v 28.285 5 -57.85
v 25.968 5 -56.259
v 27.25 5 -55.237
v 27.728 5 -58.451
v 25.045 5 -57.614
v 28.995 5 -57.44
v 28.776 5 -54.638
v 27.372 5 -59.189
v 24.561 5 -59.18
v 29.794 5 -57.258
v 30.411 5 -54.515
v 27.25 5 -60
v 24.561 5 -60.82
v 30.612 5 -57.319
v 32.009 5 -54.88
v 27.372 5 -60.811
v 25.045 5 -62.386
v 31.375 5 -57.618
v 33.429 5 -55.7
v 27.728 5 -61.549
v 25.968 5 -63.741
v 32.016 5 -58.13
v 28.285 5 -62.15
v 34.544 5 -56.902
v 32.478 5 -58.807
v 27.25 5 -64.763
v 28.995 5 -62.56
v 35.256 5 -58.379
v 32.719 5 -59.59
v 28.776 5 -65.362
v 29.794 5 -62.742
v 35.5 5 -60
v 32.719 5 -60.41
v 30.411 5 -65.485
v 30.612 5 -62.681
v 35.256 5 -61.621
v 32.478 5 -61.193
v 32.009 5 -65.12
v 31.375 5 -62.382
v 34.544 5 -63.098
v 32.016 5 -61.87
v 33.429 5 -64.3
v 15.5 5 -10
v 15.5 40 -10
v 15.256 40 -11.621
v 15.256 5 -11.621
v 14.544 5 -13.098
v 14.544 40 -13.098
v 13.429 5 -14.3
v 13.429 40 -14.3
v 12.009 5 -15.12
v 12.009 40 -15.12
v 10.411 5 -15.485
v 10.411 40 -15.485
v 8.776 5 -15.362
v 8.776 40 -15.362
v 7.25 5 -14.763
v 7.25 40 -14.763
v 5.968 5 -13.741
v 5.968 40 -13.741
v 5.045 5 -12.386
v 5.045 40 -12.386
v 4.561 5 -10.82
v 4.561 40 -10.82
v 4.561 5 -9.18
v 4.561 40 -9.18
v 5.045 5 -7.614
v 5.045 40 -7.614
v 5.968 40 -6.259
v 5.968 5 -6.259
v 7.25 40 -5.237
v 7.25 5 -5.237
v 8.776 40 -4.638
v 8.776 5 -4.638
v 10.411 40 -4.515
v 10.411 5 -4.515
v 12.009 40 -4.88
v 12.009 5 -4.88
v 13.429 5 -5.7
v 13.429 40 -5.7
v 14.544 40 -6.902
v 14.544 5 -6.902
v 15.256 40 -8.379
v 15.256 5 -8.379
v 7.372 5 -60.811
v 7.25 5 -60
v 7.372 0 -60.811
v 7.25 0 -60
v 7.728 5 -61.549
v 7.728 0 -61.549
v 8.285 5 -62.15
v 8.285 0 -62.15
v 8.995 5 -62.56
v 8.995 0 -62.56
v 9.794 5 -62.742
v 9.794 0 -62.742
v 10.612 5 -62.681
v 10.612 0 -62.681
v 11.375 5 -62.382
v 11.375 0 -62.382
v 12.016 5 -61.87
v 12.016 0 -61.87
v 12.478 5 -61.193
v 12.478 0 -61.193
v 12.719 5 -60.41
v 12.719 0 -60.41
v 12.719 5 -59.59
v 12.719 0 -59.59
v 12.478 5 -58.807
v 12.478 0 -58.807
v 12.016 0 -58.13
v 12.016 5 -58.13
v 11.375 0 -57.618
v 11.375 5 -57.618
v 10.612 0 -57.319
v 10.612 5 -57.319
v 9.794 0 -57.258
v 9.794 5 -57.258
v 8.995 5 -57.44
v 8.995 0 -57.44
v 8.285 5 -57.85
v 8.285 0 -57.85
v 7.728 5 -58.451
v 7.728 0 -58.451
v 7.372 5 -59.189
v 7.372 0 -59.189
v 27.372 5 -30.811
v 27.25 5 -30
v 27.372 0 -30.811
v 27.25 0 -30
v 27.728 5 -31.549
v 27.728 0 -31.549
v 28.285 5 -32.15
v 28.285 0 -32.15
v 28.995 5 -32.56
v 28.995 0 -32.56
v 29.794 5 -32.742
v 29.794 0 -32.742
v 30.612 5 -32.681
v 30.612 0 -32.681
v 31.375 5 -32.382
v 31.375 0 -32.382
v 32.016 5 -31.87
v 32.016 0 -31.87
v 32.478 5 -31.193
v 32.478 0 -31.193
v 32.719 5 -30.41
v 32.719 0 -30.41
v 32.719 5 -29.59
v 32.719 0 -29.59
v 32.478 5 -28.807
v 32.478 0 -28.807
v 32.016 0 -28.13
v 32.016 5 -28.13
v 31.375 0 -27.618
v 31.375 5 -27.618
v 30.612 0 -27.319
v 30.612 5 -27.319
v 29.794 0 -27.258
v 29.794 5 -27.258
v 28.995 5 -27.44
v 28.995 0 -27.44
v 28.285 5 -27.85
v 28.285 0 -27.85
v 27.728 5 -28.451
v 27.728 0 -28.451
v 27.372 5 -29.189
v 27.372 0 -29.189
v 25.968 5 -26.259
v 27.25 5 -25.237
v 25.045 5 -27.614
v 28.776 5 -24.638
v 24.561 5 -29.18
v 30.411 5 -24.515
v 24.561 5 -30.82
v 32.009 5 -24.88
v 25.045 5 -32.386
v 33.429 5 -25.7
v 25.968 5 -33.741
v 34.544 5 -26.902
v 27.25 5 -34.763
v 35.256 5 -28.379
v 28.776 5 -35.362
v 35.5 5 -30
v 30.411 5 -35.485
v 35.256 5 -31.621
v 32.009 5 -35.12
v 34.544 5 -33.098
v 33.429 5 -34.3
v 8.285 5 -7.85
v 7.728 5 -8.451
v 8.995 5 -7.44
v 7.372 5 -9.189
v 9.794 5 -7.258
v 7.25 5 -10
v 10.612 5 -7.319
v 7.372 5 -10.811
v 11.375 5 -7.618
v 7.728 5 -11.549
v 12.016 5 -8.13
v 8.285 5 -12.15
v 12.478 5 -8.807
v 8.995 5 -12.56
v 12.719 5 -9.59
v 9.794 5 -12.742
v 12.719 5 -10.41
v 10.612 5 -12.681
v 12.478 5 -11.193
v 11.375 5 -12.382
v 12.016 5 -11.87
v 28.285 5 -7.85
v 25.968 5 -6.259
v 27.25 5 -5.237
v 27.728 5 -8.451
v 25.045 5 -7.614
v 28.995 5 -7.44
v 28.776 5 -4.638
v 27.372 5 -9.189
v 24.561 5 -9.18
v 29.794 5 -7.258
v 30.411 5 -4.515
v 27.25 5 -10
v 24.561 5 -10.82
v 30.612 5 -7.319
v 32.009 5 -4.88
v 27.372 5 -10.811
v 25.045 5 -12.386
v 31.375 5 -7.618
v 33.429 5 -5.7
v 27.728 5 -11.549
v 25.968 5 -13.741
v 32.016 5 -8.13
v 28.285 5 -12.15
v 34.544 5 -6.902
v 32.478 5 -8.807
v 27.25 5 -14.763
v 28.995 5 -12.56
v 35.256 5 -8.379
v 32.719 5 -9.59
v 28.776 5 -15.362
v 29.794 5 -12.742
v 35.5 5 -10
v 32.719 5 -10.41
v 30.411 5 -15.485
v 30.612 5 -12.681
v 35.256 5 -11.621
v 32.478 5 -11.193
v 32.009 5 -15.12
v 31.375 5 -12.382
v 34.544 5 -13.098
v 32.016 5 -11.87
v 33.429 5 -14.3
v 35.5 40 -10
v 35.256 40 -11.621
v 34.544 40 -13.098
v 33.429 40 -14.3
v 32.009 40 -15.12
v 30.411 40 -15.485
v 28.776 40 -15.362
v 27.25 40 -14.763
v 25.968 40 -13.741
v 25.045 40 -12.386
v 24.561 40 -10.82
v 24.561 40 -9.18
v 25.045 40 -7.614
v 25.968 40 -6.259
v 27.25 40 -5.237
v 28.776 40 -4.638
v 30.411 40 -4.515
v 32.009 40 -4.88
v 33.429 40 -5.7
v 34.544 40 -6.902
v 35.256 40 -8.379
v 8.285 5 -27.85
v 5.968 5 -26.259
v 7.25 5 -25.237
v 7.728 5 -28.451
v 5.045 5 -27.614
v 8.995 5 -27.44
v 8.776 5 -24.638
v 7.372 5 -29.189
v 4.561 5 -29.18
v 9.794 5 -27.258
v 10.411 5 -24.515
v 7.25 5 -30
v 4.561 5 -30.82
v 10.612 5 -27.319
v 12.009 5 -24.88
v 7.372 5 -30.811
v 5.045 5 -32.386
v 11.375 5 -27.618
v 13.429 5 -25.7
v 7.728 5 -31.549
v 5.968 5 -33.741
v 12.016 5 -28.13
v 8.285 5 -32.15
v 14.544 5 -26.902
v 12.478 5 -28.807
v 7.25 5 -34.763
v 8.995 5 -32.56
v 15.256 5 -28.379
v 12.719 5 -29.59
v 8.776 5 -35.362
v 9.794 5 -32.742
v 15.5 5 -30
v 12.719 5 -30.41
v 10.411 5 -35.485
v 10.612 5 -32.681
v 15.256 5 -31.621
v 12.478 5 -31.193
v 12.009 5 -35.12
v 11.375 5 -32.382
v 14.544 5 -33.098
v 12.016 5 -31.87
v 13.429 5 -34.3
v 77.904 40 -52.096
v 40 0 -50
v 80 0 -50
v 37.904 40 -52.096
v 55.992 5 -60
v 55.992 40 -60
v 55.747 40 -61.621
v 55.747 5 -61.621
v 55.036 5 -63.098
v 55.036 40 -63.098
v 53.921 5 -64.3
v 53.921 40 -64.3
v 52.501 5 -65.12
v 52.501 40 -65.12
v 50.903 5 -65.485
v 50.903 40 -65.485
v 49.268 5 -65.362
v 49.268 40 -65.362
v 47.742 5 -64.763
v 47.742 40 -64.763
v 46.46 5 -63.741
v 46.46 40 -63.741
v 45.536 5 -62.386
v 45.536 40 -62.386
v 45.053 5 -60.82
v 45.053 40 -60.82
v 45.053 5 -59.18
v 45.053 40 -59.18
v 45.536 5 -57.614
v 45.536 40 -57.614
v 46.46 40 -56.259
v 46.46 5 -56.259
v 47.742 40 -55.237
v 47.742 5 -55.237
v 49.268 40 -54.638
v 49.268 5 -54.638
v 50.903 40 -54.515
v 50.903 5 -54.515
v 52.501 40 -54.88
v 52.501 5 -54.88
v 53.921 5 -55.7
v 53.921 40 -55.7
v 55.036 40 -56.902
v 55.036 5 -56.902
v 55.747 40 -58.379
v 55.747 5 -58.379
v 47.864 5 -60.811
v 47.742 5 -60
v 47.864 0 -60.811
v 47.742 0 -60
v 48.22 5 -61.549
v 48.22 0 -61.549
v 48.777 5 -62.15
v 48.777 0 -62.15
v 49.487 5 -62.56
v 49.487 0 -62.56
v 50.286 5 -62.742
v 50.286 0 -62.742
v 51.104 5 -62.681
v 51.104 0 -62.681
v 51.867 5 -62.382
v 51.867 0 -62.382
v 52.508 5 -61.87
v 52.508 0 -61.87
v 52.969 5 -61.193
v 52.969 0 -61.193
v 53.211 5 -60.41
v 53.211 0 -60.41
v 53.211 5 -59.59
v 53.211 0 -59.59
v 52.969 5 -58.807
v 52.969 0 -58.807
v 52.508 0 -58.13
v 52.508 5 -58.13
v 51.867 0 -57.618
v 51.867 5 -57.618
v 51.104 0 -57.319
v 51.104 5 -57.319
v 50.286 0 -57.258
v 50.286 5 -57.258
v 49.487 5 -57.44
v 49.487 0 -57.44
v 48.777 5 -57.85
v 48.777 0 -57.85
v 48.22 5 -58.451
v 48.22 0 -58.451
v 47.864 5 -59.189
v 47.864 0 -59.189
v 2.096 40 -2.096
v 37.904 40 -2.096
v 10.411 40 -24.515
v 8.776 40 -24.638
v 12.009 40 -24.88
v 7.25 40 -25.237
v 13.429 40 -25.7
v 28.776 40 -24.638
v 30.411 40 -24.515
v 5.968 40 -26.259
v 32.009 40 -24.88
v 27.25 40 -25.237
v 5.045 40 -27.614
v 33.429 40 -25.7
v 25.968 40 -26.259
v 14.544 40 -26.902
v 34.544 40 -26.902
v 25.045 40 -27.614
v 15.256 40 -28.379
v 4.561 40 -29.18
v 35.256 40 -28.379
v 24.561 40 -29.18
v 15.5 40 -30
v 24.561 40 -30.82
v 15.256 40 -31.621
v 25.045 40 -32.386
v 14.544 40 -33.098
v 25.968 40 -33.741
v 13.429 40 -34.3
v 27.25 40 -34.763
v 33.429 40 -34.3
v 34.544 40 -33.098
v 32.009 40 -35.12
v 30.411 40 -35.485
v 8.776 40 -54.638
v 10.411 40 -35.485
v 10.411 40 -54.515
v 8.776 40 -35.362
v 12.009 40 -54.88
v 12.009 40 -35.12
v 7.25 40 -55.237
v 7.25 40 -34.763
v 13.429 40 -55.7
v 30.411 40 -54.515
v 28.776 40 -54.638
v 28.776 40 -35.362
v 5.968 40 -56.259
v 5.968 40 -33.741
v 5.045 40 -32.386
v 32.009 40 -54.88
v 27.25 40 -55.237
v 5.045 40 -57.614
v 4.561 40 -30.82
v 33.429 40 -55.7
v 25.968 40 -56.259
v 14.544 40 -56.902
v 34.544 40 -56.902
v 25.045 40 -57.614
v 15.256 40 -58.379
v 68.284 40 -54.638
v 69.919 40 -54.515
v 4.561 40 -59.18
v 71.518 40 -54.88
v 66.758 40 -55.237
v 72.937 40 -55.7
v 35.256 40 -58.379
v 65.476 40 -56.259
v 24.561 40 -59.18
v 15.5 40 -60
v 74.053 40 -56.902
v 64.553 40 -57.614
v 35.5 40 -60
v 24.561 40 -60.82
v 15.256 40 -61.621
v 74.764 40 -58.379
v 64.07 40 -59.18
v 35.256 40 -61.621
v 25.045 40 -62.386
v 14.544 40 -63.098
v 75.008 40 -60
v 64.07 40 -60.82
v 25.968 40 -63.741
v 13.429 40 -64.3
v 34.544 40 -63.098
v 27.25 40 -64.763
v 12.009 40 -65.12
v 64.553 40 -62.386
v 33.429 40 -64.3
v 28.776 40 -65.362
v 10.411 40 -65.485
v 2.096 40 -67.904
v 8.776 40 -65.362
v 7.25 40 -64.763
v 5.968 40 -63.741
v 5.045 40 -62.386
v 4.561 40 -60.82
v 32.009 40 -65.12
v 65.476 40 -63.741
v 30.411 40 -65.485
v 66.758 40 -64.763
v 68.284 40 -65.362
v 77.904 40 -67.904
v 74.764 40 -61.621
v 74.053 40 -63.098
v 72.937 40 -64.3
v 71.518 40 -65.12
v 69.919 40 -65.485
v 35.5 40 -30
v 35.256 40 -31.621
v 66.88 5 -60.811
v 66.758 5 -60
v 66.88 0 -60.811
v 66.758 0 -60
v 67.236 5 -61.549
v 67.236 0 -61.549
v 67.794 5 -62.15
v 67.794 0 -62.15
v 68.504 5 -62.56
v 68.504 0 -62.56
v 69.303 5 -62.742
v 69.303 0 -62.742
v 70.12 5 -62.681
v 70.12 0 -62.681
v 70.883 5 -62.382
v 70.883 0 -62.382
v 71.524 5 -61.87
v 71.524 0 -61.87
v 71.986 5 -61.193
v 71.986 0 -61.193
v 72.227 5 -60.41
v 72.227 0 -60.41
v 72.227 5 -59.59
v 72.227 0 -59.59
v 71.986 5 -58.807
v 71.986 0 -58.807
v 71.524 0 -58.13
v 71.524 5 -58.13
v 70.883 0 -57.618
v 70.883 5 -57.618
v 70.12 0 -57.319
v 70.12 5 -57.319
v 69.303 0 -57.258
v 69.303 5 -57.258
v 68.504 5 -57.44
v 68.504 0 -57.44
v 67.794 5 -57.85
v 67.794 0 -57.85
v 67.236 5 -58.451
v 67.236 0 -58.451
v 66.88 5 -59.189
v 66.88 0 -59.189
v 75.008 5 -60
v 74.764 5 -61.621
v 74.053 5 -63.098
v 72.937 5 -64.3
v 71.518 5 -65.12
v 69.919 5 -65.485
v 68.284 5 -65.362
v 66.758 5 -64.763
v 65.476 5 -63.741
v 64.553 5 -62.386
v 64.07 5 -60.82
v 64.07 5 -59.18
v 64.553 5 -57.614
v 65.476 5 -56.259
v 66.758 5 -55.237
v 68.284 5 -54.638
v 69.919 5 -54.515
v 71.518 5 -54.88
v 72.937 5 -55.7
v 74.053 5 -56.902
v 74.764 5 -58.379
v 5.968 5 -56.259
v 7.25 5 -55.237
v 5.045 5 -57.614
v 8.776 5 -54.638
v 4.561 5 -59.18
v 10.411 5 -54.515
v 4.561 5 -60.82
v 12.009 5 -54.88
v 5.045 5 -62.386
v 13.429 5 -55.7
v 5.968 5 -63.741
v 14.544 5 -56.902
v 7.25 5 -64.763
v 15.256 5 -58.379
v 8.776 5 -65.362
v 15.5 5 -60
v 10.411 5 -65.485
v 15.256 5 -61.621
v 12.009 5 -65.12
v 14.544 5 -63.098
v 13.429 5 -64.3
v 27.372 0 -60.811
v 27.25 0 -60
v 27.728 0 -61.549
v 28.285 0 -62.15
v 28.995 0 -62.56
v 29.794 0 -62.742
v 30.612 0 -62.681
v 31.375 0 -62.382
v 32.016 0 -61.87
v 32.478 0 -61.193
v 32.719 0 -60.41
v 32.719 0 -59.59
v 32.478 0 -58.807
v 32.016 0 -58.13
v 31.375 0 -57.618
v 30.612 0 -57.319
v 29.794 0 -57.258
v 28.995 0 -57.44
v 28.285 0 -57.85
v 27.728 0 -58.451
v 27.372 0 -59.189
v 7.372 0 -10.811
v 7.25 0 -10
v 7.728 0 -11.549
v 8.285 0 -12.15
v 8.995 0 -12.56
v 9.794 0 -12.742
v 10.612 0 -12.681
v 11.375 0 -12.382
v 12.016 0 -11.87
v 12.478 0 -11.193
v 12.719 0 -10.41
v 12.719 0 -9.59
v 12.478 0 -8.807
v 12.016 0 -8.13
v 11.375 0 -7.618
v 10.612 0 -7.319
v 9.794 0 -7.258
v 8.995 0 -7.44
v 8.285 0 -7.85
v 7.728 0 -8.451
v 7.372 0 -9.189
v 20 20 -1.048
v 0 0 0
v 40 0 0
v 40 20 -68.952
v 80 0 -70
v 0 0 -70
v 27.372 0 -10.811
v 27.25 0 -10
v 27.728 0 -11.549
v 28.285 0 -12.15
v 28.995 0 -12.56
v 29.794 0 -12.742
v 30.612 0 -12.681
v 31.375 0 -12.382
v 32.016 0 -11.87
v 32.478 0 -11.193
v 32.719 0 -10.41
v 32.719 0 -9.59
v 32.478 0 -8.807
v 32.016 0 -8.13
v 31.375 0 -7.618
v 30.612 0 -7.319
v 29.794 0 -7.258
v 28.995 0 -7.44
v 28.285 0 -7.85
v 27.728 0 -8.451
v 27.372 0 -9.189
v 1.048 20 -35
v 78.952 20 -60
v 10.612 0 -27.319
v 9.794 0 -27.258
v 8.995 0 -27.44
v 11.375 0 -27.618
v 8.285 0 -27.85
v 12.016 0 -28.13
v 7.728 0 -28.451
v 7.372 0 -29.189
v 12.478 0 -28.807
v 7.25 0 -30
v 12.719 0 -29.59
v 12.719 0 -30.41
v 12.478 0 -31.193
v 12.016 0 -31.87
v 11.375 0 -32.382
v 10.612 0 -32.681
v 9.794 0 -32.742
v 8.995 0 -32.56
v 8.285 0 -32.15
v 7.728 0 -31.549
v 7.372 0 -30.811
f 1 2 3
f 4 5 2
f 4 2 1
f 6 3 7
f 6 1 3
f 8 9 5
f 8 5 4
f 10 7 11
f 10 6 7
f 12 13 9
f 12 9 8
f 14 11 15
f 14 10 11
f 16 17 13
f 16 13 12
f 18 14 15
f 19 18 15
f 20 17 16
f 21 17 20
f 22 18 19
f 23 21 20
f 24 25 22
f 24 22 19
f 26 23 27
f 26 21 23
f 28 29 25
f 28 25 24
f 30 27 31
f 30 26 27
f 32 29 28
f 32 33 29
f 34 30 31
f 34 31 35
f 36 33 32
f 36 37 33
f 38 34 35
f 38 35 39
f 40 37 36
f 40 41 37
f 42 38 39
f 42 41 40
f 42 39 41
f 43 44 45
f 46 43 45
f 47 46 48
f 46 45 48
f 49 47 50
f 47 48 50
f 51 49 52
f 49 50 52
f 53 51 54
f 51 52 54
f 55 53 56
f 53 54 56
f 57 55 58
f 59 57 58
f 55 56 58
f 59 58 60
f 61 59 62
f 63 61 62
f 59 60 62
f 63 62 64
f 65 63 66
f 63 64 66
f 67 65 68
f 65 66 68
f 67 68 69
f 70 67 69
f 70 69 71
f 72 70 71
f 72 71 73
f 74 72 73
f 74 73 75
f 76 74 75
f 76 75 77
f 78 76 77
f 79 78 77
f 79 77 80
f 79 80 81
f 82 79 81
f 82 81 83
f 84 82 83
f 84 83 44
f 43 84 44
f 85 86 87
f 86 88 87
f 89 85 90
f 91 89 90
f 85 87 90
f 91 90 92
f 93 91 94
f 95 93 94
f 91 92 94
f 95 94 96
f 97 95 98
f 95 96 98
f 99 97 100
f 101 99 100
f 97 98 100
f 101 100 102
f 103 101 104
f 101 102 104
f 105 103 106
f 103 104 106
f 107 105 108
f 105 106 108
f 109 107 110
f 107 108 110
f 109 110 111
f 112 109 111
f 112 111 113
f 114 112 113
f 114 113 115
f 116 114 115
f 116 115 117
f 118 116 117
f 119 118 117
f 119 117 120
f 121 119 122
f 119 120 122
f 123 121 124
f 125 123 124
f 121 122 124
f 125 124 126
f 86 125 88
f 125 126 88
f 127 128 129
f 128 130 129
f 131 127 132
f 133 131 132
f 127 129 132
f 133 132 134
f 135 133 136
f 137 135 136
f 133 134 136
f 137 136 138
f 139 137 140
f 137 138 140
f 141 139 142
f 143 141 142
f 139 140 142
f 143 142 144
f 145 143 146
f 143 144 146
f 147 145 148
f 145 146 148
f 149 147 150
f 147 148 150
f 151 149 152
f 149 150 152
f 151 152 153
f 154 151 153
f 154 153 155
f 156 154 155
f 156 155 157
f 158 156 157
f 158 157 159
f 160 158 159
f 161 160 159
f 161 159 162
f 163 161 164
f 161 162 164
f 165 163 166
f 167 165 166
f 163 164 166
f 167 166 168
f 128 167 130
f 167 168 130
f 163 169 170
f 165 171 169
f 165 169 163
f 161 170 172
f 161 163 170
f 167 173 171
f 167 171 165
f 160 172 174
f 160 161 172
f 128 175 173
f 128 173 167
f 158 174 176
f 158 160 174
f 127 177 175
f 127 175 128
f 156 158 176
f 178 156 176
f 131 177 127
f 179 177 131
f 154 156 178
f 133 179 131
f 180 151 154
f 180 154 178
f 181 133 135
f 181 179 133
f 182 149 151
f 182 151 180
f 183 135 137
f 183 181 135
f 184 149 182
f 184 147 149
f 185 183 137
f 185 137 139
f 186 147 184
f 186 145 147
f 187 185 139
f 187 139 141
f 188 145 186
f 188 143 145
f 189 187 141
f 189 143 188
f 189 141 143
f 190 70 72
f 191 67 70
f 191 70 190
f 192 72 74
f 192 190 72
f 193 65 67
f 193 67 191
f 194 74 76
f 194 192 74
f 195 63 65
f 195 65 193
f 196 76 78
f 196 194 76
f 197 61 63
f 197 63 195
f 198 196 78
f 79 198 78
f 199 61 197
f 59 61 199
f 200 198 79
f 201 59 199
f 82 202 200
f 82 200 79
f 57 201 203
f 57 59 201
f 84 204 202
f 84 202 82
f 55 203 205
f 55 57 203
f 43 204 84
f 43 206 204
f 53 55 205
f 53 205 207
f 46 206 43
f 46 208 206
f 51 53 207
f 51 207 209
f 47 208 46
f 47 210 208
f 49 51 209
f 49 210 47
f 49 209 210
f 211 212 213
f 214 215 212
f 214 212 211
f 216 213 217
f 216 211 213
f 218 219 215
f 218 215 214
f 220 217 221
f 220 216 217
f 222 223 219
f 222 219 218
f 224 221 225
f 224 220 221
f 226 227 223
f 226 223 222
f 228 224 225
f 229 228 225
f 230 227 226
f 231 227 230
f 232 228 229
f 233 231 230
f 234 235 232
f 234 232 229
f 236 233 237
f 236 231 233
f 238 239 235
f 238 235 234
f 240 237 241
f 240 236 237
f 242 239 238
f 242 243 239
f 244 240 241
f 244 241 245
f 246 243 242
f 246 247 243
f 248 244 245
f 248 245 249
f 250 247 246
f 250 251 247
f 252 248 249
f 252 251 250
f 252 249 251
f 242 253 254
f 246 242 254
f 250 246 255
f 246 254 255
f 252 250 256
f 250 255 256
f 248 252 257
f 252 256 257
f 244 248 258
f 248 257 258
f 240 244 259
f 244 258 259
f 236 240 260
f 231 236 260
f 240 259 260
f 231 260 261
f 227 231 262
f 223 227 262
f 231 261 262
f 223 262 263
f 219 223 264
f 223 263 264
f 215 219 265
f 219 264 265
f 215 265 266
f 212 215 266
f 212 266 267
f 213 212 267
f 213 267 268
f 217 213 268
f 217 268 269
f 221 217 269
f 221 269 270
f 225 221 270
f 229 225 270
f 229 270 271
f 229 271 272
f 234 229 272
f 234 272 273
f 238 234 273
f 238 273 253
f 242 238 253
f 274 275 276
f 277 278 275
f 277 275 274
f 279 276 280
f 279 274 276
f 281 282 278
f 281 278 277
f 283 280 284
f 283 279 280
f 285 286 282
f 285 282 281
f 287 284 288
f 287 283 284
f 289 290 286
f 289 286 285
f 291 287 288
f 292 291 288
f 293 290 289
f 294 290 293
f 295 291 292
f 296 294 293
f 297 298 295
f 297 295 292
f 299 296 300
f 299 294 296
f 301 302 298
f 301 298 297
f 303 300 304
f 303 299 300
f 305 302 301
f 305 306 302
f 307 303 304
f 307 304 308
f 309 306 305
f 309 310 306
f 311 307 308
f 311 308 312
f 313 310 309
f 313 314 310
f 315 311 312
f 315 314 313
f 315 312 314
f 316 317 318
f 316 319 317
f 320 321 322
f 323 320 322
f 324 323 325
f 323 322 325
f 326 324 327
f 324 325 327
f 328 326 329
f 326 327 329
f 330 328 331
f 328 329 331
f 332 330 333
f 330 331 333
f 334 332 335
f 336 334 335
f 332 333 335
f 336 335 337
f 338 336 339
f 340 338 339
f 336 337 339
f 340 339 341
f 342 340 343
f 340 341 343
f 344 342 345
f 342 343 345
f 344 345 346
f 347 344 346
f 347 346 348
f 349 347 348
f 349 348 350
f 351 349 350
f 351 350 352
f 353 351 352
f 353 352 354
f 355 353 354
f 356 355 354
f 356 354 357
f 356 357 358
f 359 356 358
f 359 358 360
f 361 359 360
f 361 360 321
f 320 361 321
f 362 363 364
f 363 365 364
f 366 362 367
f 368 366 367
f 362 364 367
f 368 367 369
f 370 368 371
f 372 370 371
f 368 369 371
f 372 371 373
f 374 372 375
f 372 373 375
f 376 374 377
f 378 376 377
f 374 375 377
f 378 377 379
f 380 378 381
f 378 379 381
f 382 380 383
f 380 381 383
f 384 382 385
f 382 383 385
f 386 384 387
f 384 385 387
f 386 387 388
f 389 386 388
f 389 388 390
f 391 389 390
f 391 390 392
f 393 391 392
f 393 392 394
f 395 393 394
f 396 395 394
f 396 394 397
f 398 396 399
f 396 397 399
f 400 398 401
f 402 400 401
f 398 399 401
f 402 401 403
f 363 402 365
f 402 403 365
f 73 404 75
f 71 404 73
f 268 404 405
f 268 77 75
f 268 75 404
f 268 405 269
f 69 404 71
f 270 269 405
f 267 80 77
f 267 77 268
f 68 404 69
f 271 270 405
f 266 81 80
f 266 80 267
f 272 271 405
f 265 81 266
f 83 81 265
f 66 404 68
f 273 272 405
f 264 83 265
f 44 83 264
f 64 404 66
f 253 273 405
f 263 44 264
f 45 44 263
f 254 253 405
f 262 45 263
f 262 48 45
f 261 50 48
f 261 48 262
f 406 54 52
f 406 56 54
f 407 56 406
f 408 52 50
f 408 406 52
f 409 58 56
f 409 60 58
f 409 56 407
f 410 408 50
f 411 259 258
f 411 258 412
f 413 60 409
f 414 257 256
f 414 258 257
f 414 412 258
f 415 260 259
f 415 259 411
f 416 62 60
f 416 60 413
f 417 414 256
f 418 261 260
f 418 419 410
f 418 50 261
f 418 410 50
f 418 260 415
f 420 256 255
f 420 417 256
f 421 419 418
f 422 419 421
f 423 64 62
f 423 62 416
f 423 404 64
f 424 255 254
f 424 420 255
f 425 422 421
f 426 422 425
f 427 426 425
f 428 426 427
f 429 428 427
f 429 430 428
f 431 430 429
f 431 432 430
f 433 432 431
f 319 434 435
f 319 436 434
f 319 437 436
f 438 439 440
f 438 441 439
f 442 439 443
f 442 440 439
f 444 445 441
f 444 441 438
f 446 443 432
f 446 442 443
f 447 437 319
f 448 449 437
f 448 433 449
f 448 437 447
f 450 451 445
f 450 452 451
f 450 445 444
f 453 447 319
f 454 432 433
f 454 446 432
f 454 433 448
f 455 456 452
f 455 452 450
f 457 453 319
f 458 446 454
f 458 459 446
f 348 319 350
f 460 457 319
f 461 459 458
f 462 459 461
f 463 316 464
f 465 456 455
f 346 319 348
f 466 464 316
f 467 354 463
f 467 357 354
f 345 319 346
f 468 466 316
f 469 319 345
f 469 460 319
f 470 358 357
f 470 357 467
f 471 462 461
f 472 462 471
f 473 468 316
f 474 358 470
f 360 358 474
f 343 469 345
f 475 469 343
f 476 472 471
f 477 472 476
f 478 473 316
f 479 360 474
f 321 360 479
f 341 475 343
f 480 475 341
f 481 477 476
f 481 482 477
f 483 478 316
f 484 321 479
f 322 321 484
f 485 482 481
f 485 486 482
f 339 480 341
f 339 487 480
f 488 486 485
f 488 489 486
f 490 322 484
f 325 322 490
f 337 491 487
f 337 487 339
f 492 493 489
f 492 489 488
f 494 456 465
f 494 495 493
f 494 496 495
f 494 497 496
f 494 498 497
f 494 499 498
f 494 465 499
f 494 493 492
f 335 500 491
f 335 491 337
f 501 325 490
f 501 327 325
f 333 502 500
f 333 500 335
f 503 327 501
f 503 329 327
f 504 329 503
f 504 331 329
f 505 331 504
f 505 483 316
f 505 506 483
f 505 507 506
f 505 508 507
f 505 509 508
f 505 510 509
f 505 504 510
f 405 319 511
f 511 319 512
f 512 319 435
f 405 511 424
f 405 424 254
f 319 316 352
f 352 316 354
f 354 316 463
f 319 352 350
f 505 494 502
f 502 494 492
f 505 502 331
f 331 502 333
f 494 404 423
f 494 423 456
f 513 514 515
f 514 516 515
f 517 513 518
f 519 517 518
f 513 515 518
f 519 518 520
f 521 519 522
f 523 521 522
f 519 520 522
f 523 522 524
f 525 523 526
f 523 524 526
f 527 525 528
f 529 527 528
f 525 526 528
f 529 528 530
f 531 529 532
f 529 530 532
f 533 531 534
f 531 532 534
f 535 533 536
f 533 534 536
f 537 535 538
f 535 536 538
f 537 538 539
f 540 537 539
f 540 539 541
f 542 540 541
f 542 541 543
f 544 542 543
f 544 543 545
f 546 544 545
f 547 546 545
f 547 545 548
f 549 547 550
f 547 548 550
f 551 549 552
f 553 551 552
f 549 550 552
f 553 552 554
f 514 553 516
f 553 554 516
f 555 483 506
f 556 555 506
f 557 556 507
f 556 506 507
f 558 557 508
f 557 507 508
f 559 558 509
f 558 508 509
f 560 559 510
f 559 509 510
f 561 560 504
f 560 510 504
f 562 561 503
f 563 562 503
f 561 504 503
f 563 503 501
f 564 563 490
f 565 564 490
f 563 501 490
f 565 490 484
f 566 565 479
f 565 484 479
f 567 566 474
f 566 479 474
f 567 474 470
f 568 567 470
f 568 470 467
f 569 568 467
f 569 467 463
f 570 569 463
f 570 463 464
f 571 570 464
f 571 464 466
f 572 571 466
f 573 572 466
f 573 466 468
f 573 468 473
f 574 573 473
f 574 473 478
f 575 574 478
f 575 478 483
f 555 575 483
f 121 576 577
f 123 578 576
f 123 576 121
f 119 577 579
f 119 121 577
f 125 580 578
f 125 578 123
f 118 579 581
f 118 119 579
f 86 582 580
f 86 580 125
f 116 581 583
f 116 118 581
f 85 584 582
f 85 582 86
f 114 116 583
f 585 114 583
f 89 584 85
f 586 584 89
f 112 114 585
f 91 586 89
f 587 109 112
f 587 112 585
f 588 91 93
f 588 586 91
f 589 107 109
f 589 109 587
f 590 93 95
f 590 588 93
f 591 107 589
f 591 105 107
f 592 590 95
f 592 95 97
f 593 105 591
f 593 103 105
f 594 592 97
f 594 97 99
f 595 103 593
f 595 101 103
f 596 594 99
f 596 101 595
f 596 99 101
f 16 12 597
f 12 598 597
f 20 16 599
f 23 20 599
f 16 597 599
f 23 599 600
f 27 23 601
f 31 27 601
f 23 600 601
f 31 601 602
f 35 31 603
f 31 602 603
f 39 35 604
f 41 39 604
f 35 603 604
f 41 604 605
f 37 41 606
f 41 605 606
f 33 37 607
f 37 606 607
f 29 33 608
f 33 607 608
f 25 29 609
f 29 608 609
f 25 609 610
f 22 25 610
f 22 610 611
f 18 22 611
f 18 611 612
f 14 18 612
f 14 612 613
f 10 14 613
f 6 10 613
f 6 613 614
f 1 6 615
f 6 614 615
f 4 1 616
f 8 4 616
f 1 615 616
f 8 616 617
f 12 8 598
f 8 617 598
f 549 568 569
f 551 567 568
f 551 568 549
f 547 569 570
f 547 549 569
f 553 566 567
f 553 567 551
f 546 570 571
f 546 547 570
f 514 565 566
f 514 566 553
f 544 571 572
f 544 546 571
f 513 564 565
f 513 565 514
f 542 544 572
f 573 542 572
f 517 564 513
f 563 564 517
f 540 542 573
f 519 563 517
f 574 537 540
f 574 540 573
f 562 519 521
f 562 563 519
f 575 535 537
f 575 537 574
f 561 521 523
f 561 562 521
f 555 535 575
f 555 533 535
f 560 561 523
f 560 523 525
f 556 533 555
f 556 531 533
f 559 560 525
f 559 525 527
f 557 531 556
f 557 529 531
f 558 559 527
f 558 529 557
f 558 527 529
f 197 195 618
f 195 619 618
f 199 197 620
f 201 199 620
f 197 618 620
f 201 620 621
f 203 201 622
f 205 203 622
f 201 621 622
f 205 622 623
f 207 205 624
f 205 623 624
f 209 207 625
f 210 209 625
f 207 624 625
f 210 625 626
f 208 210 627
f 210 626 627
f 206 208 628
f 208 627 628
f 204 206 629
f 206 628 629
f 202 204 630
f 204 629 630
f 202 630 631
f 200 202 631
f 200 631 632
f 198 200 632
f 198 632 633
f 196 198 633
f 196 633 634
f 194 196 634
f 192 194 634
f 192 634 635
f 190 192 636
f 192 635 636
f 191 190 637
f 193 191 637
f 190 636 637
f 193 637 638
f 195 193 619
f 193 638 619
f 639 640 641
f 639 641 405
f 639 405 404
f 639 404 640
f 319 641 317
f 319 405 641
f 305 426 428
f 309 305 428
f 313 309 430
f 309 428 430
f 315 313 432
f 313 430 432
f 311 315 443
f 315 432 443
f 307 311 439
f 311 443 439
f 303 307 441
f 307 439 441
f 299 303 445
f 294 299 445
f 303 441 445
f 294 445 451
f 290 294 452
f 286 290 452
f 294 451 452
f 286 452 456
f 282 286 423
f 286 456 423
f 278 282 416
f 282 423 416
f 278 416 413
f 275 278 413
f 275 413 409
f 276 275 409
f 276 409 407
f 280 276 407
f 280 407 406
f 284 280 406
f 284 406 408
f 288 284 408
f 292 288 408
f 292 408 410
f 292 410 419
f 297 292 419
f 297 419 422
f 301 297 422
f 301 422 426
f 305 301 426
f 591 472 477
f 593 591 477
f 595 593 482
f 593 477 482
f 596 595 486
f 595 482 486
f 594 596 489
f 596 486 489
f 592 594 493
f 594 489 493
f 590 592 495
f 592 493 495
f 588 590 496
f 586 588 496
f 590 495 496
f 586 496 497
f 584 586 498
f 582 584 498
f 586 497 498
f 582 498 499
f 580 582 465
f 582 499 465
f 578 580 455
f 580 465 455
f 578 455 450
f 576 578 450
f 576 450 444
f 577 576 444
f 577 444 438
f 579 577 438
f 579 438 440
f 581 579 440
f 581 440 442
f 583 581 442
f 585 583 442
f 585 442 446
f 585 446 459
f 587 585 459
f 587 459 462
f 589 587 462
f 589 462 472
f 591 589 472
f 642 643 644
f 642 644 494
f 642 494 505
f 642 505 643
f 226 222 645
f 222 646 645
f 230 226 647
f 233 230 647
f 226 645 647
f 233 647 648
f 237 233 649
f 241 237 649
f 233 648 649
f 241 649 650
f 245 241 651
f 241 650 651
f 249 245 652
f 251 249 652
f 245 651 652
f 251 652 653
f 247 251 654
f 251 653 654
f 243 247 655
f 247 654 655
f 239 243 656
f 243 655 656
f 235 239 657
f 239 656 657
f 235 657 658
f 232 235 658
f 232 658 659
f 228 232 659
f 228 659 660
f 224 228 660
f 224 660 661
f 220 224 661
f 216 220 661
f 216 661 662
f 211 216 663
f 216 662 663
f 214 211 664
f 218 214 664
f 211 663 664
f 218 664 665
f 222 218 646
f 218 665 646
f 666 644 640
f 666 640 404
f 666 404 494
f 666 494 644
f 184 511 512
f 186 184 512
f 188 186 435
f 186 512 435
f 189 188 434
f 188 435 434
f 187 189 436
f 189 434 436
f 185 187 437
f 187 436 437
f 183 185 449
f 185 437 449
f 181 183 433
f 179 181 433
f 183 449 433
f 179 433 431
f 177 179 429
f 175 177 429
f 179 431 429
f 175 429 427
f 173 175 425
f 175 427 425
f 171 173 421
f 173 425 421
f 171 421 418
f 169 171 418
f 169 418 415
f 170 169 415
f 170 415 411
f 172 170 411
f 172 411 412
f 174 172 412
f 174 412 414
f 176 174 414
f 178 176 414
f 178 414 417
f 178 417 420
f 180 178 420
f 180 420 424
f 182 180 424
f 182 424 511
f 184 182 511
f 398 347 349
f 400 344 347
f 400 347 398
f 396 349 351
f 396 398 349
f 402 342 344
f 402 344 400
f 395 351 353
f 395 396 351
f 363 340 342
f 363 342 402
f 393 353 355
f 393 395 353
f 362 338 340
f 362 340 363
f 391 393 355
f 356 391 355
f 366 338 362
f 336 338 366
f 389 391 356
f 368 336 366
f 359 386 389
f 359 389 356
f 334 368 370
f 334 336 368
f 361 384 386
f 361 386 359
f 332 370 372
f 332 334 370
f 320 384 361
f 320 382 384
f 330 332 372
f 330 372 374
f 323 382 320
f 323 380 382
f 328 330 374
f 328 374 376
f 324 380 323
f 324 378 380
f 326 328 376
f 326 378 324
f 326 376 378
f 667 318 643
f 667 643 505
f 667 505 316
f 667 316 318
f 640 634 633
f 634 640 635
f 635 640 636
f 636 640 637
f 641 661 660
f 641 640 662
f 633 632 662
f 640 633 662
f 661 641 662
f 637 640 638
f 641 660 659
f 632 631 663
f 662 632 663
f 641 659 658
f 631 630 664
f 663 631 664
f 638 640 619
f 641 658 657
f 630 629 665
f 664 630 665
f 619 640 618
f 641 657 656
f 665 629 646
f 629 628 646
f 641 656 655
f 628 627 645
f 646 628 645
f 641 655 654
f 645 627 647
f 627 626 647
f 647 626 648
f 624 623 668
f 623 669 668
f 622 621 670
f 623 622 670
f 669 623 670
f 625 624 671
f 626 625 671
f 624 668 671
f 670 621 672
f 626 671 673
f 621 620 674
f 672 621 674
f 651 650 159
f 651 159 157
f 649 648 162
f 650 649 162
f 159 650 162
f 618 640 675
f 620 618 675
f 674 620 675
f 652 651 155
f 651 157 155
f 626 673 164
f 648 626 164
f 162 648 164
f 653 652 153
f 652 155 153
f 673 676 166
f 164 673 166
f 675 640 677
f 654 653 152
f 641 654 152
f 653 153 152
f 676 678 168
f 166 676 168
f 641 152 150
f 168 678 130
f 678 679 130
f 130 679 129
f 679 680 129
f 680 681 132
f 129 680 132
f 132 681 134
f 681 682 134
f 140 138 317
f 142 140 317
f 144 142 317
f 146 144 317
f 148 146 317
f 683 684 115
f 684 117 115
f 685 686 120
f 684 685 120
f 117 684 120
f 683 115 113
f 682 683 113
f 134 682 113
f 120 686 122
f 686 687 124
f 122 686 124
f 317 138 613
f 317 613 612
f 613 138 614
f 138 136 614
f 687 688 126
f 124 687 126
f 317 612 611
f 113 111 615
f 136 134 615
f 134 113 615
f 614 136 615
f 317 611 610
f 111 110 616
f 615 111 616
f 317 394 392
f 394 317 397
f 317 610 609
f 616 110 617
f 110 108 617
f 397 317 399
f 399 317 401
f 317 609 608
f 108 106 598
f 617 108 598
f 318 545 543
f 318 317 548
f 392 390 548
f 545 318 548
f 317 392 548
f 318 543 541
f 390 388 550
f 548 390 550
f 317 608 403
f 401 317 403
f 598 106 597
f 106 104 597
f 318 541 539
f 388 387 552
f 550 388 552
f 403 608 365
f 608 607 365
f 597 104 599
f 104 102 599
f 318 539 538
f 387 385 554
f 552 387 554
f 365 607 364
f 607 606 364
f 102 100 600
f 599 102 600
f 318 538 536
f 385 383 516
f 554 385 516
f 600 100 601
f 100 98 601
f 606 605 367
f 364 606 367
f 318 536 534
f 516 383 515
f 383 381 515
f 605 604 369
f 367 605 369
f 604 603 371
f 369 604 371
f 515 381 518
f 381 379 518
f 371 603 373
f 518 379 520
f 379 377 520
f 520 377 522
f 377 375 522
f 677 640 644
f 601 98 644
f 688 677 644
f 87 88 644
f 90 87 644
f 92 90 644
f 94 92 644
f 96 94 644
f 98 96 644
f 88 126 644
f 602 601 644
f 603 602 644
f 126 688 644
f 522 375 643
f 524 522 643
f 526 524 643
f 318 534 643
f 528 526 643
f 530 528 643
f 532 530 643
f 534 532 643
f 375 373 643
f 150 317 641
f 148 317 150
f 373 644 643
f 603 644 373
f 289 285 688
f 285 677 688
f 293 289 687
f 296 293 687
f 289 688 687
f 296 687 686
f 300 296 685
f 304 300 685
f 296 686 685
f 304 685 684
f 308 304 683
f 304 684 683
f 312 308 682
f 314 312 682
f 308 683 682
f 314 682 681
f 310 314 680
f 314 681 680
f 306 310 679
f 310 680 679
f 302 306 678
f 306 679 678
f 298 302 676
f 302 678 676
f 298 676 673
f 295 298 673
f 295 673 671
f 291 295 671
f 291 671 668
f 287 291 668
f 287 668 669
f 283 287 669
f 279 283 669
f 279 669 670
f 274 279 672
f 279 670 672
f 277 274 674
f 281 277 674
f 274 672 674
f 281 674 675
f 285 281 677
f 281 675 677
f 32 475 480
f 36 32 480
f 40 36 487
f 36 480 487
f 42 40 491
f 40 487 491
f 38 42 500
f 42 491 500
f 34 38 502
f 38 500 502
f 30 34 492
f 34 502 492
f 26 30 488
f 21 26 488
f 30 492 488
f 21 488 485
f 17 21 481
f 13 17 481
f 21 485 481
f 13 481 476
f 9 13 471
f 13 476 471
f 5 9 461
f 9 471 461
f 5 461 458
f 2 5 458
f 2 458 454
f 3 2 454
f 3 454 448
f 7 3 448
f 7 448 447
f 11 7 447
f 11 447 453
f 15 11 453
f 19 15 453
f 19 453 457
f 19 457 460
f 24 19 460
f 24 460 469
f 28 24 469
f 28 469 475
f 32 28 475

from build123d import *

# Parameters (mm, degrees)
BOSS_EXTRUDE1_DEPTH             = 40
BOSS_EXTRUDE1_TAPER             = 3
CBORE_FOR_M5_SBHCS1_D           = 5.5
CBORE_FOR_M5_SBHCS1_CBORE_D     = 11
CBORE_FOR_M5_SBHCS1_CBORE_DEPTH = 35


with BuildPart() as part:
    # Sketch1 → Boss-Extrude1 (new body)
    with BuildSketch(Plane(origin=(0, 0, 0), x_dir=(1, 0, 0), z_dir=(0, 1, 0))):
        Polygon((0, 0), (40, 0), (40, 50), (80, 50), (80, 70), (0, 70), align=None)
    extrude(amount=BOSS_EXTRUDE1_DEPTH, taper=BOSS_EXTRUDE1_TAPER)

    # CBORE for M5 SBHCS1 (through all)
    with Locations(Plane(origin=(0, 40, 0), x_dir=(1, 0, 0), z_dir=(0, 1, 0))):
        with Locations((69.508196721, 60), (30, 10), (10, 10), (10, 60), (50.491803279, 60), (30, 60), (10, 30), (30, 30)):
            CounterBoreHole(CBORE_FOR_M5_SBHCS1_D / 2, CBORE_FOR_M5_SBHCS1_CBORE_D / 2, CBORE_FOR_M5_SBHCS1_CBORE_DEPTH)


solid = part.part
